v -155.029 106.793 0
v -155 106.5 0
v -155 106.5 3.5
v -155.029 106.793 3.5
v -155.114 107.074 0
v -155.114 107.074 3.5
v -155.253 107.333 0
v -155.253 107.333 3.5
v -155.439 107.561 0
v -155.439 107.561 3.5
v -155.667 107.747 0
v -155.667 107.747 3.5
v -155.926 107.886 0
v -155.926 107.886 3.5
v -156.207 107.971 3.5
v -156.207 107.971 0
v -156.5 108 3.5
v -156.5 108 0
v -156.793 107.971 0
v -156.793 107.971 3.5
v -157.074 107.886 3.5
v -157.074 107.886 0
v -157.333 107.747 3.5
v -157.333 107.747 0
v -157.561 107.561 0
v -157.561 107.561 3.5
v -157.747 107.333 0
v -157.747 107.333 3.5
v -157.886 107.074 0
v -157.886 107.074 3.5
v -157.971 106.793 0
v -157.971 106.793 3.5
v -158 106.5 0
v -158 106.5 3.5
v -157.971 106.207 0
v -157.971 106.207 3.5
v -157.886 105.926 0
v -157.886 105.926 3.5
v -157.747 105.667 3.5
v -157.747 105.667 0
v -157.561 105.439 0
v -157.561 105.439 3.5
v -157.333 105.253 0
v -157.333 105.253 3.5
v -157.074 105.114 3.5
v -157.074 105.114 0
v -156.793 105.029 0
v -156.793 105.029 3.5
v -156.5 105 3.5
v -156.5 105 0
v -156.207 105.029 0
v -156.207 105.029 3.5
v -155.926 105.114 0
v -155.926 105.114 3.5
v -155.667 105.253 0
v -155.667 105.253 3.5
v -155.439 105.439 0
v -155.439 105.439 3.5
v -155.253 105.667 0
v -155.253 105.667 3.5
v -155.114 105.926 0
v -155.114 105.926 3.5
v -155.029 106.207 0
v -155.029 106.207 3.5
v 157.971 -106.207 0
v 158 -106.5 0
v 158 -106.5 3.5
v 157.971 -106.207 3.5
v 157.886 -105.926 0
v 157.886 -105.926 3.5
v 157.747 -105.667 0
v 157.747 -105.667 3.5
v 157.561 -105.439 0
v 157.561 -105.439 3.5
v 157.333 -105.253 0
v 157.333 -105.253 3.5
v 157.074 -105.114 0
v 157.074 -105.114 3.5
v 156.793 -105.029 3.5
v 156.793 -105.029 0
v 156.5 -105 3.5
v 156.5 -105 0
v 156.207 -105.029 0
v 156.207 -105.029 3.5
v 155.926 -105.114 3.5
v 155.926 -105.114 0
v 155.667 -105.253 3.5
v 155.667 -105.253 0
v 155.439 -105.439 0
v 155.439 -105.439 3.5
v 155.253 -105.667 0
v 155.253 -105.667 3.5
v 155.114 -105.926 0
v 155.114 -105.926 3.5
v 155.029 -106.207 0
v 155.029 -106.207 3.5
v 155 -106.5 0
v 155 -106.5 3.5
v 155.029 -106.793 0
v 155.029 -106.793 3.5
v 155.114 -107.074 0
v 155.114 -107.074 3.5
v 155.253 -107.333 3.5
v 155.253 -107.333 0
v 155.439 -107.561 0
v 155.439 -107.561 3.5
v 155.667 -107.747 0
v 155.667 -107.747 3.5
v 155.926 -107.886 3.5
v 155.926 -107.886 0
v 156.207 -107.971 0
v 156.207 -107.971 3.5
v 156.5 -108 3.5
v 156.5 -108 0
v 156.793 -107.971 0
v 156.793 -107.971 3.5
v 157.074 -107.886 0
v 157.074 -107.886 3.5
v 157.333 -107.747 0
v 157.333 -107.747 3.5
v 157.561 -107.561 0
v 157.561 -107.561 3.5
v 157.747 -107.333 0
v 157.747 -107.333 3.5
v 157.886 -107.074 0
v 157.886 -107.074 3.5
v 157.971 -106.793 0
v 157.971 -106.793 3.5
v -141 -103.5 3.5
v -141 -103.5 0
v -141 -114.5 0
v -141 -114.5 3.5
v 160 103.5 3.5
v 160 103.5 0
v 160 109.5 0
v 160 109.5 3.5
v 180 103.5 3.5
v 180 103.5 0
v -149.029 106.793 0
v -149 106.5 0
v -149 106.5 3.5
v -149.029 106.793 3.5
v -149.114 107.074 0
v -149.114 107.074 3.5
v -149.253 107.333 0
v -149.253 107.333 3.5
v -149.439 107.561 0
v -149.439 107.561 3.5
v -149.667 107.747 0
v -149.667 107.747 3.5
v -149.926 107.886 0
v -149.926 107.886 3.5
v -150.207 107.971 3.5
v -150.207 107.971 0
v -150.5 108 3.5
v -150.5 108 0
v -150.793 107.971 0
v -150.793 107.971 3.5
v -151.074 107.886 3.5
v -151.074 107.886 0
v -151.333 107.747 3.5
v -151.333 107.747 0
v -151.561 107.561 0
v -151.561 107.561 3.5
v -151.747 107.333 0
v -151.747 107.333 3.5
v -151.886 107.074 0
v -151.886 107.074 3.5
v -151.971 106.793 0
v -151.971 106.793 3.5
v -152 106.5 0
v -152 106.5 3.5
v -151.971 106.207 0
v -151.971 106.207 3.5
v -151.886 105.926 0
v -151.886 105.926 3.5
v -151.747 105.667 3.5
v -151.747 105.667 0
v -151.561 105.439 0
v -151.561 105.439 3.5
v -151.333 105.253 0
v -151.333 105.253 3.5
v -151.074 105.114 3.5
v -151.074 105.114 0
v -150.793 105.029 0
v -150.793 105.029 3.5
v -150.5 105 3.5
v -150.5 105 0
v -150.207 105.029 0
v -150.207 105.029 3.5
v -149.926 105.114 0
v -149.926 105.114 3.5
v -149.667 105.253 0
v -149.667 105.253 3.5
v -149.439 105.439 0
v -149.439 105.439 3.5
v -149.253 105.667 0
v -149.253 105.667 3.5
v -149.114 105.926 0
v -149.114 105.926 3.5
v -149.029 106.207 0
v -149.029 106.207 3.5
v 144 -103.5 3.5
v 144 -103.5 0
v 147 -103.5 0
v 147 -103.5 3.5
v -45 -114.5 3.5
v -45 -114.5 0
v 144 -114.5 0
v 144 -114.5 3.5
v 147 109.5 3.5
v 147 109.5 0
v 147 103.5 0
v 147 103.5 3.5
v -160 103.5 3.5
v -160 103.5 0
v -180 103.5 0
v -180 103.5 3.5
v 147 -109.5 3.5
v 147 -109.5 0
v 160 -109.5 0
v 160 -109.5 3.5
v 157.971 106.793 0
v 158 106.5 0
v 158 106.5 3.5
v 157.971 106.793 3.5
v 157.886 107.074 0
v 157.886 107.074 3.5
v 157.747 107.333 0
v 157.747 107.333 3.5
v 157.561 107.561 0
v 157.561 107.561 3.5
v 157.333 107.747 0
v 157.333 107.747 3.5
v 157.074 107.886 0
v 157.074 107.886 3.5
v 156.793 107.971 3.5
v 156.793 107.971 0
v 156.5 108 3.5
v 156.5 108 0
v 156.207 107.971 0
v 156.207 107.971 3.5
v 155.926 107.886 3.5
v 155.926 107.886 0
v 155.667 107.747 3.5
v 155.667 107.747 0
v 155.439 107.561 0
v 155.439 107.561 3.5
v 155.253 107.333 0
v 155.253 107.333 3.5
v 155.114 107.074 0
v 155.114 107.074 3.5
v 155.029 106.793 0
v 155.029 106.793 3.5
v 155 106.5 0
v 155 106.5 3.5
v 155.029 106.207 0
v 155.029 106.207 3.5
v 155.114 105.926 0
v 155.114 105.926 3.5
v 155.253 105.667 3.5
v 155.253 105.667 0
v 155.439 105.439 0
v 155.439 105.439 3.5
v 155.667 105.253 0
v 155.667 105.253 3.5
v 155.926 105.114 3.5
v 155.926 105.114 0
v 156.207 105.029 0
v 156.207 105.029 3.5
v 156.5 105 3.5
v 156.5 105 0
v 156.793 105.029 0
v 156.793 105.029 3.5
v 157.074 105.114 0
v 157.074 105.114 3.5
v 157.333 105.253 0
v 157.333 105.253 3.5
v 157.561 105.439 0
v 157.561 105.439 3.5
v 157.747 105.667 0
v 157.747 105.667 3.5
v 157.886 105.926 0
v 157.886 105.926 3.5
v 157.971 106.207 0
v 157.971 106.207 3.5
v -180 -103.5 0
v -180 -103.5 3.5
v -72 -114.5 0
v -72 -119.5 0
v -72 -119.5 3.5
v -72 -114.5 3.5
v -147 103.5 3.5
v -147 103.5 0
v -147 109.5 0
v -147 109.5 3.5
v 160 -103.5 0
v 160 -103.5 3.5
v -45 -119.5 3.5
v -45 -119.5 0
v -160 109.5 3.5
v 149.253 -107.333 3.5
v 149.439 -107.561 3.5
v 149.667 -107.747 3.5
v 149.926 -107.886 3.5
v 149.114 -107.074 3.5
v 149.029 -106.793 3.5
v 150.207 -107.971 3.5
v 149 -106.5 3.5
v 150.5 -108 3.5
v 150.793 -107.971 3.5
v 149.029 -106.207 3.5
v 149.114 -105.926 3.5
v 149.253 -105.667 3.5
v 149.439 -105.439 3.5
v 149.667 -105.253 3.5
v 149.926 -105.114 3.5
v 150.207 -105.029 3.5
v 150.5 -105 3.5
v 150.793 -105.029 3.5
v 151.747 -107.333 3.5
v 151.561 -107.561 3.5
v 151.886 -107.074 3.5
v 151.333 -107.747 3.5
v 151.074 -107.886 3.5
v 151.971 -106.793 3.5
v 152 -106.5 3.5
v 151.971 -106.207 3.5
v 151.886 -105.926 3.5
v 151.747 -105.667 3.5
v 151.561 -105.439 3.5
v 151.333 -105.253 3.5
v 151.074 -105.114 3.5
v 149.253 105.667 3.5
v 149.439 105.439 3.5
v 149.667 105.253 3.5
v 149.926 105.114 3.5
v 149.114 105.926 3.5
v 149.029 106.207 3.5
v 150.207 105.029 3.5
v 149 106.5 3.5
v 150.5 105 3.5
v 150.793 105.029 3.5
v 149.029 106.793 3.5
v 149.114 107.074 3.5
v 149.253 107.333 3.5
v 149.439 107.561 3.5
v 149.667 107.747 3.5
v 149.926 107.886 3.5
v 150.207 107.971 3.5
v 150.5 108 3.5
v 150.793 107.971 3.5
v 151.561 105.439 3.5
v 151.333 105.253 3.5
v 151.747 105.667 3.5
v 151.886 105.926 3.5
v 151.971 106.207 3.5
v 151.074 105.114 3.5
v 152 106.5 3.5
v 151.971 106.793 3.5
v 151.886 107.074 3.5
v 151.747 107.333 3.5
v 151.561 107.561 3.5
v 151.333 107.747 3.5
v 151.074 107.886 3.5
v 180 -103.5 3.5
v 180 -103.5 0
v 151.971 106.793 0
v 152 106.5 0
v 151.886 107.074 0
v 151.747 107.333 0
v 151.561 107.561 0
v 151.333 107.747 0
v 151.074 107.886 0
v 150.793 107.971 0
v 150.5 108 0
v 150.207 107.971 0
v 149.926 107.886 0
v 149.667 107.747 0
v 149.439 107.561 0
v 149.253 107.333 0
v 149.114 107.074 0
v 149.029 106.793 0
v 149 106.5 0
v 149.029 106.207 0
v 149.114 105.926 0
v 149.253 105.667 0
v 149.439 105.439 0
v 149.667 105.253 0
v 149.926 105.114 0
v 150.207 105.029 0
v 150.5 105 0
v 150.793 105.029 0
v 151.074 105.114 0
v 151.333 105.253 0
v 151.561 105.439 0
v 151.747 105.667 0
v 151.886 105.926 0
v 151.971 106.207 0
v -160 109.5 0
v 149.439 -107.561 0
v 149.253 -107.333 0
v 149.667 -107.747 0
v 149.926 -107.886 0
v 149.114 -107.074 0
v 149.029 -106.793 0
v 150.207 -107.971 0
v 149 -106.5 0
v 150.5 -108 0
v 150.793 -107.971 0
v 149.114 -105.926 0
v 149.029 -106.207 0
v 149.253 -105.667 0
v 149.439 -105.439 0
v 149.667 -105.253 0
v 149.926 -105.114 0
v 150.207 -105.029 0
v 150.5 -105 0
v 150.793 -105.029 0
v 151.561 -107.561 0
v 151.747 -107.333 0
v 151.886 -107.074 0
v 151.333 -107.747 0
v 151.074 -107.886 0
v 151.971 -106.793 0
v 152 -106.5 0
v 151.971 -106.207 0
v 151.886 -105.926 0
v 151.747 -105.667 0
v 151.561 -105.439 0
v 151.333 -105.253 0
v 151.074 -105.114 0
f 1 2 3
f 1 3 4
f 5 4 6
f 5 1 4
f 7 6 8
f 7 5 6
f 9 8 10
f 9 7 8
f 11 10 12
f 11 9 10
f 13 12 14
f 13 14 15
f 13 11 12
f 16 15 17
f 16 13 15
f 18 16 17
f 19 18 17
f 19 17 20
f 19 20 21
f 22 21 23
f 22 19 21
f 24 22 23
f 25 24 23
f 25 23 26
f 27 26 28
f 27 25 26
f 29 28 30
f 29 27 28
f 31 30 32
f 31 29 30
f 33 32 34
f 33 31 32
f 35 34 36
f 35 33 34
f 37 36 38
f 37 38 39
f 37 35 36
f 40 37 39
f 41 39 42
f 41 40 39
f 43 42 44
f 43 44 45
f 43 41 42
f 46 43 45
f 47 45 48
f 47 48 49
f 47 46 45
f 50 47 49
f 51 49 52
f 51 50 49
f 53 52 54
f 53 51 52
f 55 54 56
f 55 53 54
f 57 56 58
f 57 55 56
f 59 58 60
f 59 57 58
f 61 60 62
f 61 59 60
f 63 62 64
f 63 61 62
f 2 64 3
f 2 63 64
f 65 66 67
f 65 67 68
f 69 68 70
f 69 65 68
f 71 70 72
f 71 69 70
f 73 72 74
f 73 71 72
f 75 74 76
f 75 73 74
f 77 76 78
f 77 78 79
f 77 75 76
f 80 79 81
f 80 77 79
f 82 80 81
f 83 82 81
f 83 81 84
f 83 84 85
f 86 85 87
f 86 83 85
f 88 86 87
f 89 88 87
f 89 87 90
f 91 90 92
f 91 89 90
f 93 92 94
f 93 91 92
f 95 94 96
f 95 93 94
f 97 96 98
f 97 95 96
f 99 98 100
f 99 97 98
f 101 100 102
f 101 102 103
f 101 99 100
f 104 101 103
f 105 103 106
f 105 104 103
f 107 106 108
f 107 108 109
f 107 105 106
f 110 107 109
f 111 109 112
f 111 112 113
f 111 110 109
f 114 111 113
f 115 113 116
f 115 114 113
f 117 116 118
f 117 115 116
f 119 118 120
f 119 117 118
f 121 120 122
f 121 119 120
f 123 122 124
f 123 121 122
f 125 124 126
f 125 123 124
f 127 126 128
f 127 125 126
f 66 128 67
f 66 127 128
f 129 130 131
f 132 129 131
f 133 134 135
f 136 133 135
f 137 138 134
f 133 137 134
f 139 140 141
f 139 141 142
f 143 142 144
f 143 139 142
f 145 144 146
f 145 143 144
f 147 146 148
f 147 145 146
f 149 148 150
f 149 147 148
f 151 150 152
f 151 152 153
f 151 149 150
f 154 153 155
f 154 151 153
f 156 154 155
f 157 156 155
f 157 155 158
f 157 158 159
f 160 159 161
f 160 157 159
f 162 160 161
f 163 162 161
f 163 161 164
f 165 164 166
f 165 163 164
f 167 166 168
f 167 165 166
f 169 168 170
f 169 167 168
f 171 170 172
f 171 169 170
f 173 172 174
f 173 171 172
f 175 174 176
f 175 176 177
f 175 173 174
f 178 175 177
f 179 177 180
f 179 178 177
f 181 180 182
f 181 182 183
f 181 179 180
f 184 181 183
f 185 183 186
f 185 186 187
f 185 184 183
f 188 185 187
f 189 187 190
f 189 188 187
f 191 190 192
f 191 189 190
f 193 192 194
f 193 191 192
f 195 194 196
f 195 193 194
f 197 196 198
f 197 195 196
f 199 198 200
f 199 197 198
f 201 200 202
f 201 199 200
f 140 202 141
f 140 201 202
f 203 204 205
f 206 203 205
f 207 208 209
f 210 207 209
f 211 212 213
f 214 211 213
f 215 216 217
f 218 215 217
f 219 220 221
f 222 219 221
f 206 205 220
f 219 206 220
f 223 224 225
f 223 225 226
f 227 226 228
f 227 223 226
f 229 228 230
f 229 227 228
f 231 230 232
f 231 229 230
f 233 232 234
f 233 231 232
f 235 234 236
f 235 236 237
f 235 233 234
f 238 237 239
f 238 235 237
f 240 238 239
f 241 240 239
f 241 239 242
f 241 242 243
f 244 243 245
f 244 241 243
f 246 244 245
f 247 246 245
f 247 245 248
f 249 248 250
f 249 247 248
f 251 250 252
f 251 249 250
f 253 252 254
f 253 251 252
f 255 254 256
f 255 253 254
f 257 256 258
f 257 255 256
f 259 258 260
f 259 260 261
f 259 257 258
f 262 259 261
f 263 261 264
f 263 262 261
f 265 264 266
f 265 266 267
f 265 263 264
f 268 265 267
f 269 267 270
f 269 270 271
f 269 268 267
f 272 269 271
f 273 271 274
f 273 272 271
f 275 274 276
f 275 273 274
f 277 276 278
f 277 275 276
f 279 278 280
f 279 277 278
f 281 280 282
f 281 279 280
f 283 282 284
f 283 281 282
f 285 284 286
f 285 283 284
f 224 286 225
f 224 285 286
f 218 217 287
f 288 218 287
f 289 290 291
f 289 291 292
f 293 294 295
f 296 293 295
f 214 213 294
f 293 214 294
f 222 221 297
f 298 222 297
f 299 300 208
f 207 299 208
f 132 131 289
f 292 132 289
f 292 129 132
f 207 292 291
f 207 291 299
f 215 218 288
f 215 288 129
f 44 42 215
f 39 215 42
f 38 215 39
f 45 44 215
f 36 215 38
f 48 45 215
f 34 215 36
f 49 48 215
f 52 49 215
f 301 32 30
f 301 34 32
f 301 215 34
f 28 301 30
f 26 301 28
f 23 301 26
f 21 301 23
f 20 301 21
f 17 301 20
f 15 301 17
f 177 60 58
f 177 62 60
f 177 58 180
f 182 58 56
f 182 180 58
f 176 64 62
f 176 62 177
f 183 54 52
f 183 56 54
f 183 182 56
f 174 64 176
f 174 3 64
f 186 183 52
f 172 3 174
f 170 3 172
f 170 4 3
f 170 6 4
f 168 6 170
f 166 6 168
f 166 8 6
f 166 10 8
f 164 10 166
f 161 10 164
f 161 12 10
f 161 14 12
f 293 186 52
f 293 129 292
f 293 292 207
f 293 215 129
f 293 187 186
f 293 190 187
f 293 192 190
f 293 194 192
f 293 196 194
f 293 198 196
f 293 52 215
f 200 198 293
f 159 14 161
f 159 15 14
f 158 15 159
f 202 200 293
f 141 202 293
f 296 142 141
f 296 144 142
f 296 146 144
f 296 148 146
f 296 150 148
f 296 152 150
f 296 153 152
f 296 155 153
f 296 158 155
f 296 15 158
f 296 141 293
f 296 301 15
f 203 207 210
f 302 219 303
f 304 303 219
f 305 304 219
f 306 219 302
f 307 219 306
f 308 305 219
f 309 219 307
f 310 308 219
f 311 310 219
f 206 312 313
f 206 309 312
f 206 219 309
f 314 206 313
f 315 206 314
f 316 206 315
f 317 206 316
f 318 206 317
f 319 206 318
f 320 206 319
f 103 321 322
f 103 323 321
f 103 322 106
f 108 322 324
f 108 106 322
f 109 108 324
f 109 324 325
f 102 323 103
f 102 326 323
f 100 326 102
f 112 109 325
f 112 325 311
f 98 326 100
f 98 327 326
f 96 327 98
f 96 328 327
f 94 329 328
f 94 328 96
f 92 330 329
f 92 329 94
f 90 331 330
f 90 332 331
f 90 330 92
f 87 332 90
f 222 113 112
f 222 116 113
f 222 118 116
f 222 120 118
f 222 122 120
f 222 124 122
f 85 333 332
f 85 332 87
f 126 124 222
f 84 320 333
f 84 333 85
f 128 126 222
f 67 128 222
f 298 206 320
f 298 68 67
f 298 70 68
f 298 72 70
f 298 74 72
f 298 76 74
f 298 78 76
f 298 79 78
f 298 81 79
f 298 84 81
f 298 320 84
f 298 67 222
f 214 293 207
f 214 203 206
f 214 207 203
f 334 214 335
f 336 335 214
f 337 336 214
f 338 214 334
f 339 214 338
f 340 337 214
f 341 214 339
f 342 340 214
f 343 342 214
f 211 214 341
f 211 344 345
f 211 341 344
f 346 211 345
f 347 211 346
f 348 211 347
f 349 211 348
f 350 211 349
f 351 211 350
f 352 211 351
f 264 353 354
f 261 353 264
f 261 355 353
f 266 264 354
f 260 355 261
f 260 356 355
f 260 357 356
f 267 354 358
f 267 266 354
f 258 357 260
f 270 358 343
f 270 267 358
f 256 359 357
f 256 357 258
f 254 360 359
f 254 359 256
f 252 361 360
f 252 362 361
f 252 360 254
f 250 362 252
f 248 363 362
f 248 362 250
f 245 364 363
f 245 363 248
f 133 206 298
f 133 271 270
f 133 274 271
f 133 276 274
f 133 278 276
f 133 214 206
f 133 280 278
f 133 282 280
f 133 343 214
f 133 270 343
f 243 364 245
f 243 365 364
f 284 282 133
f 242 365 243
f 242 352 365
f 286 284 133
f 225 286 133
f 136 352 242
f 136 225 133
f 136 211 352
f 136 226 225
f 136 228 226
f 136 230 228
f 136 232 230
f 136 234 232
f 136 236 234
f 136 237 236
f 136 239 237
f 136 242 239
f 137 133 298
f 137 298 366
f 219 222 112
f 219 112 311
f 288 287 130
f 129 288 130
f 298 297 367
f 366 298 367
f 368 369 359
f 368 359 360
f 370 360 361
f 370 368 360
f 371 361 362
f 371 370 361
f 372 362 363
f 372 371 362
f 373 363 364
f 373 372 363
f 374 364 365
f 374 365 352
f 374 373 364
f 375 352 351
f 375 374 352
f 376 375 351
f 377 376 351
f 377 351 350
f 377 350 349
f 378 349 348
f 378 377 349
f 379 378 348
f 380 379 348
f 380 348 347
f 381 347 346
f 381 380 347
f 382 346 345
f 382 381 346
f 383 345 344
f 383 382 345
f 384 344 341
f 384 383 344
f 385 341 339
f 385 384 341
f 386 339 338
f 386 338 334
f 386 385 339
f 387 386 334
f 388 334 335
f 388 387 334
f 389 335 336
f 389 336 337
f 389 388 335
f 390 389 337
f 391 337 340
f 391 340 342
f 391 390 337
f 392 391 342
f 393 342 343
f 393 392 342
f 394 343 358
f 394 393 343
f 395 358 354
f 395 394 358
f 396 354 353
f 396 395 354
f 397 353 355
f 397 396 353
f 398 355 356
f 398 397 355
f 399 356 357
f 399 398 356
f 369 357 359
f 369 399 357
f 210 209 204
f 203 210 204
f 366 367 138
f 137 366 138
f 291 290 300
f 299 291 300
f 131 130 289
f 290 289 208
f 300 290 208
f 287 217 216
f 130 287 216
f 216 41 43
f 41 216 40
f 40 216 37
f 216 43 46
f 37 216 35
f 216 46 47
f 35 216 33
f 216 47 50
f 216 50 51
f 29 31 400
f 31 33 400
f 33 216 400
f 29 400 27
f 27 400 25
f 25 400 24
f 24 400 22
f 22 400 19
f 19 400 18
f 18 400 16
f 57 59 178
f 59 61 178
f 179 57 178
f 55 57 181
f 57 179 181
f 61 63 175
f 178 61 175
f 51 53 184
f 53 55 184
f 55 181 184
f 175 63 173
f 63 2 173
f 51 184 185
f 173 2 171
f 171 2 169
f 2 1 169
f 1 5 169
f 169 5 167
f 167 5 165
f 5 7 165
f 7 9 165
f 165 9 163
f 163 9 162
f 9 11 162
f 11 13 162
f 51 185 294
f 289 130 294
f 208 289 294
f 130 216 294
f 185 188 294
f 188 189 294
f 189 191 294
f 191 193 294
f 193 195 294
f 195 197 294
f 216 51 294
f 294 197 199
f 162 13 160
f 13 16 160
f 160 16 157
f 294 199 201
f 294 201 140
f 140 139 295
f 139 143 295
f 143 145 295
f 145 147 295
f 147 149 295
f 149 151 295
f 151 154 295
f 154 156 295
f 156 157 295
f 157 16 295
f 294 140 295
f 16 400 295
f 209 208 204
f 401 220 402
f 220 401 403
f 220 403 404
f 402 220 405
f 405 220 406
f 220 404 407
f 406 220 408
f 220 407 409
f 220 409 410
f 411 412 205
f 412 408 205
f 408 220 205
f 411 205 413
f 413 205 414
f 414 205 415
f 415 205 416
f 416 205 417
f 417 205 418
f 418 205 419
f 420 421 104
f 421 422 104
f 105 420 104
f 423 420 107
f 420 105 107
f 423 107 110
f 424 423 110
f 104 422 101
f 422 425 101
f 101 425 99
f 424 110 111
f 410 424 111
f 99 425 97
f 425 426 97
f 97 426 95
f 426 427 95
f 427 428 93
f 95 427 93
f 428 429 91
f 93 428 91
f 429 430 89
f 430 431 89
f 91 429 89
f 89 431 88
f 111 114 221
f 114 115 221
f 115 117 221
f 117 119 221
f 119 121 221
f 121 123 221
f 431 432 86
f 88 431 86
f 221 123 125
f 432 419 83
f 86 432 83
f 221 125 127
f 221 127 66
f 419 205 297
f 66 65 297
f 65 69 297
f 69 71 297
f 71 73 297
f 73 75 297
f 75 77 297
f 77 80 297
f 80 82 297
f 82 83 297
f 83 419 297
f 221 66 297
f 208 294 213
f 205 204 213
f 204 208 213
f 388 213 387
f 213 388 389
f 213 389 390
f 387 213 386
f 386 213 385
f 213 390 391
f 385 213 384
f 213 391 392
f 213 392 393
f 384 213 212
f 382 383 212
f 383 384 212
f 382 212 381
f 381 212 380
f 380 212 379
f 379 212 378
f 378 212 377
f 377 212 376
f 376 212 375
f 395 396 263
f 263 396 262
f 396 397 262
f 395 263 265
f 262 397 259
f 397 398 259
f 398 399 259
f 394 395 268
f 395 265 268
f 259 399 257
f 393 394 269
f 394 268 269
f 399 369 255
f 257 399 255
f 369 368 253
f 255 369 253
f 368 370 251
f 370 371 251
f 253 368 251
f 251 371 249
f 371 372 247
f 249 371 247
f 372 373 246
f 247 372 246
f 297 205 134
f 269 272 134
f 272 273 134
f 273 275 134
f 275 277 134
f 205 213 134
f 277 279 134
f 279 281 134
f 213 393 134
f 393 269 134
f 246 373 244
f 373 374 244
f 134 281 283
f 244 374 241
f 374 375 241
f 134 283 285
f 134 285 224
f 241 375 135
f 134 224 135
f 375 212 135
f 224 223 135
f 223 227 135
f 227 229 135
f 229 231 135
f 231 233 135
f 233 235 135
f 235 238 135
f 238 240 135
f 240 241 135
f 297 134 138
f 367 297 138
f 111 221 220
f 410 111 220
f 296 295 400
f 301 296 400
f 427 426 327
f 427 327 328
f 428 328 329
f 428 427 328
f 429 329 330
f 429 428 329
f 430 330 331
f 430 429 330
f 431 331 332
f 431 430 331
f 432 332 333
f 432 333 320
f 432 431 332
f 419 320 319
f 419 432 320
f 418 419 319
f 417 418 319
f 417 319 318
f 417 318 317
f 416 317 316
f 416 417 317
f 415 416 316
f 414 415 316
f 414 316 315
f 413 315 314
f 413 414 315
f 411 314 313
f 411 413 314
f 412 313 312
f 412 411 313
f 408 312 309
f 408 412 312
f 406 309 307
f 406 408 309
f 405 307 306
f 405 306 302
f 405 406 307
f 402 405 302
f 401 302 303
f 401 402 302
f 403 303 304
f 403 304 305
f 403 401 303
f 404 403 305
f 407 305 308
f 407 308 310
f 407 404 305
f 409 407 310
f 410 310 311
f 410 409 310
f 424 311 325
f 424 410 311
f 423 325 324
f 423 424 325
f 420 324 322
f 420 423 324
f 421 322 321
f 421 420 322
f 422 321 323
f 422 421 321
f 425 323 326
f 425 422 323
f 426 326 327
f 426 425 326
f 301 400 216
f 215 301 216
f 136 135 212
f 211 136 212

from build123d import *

# Parameters (mm, degrees)
F0_R     = 1.5
F0_W     = 27
F0_H     = 5
F2_DEPTH = 3.5


with BuildPart() as f2:
    # F0 (on Top) → F2 (new body)
    with BuildSketch(Plane.XY):
        Polygon((-160, 103.5), (-180, 103.5), (-180, -103.5), (-141, -103.5), (-141, -114.5), (-72, -114.5), (-45, -114.5), (144, -114.5), (144, -103.5), (147, -103.5), (147, -109.5), (160, -109.5), (160, -103.5), (180, -103.5), (180, 103.5), (160, 103.5), (160, 109.5), (147, 109.5), (147, 103.5), (-147, 103.5), (-147, 109.5), (-160, 109.5), align=None)
        with Locations((150.5, -106.5)):
            Circle(F0_R, mode=Mode.SUBTRACT)
        with Locations((156.5, -106.5)):
            Circle(F0_R, mode=Mode.SUBTRACT)
        with Locations((-156.5, 106.5)):
            Circle(F0_R, mode=Mode.SUBTRACT)
        with Locations((-150.5, 106.5)):
            Circle(F0_R, mode=Mode.SUBTRACT)
        with Locations((150.5, 106.5)):
            Circle(F0_R, mode=Mode.SUBTRACT)
        with Locations((156.5, 106.5)):
            Circle(F0_R, mode=Mode.SUBTRACT)
        with Locations((-58.5, -117)):
            Rectangle(F0_W, F0_H)
    extrude(amount=F2_DEPTH)


solid = f2.part
